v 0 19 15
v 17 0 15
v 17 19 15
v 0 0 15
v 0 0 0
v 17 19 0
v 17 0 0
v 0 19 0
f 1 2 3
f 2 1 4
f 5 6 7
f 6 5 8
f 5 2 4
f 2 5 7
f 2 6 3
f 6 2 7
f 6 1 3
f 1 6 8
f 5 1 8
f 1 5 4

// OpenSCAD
// Generated by SolidPython 1.0.1 on 2020-07-29 00:46:56


cube(size = [17, 19, 15]);
/***********************************************
*********      SolidPython code:      **********
************************************************
 
# import packages: SolidPython
from solid import *
from solid.utils import *
from itertools import chain, combinations, permutations


class Resize:

    def __init__(self, scad_file):
        self.scad_file = scad_file
        #self.scad_file = import_scad(scad_file)
        # cone/cylinder param:
        self.r1 = 0
        self.r2 = 0
        self.h = 0
        # rectangular prism param:
        self.w = 0
        self.l = 0
        # ellipse param:
        self.r = 0

    # import OpenScad code (file name corresponds to shape)


    # classify shape + parameters
    def assign(self, param1, param2, param3):
        if self.scad_file == 'cone.scad':
            self.r1 = param1
            self.r2 = param2
            self.h = param3
        elif self.scad_file == 'cylinder.scad':
            self.r1 = param1
            self.r2 = param2
            self.h = param3
        elif self.scad_file == 'rectangularPrism.scad':
            self.h = param1
            self.l = param2
            self.w = param3
        else:
            self.r = param1
            self.h = param2

    # resize parameters
    def iterate(self):
        x = range(3, 20, 2)
        i = 1
        if self.scad_file == 'cone.scad':
            tempList = list(permutations(x, 2))
            for temp in tempList:
                param1 = temp[0]
                param2 = temp[1]
                filepath = 'produced_scad_files/' + 'cone' + str(param1) + '_' + str(param2) + '_' + '.scad'
                scad_render_to_file(cylinder(h=param1, r1=param2, r2=0), filepath)

        elif self.scad_file == 'cylinder.scad':
            tempList = list(permutations(x, 3))
            for temp in tempList:
                param1 = temp[0]
                param2 = temp[1]
                filepath = 'produced_scad_files/' + 'cylinder' + str(param1) + '_' + str(param2) + '_' + '.scad'
                scad_render_to_file(cylinder(h=param1, r1=param2, r2=param2), filepath)

        elif self.scad_file == 'rectangularPrism.scad':
            tempList = list(permutations(x, 3))
            for temp in tempList:
                param1 = temp[0]
                param2 = temp[1]
                param3 = temp[2]
                filepath = 'produced_scad_files/' + 'rectangularPrism' + str(param1) + '_' + str(param2) + '_' + str(
                    param3) + '.scad'
                scad_render_to_file(cube(size=(param1, param2, param3)), filepath)

        elif self.scad_file == 'ellipse.scad':
            tempList = list(permutations(x, 4))
            for temp in tempList:
                param1 = temp[0]
                param2 = temp[1]
                param3 = temp[2]
                param4 = temp[3]
                filepath = 'produced_scad_files/' + 'ellipse' + str(param1) + '_' + str(param2) + '_' + str(param3) + '_' + str(param4) + '.scad'
                scad_render_to_file(scale([param1, param2, param3])(sphere(r=param4)), filepath)

    def render_to_scadfile(self):
        scad_render_to_file(scad, 'example.scad') 
 
************************************************/
